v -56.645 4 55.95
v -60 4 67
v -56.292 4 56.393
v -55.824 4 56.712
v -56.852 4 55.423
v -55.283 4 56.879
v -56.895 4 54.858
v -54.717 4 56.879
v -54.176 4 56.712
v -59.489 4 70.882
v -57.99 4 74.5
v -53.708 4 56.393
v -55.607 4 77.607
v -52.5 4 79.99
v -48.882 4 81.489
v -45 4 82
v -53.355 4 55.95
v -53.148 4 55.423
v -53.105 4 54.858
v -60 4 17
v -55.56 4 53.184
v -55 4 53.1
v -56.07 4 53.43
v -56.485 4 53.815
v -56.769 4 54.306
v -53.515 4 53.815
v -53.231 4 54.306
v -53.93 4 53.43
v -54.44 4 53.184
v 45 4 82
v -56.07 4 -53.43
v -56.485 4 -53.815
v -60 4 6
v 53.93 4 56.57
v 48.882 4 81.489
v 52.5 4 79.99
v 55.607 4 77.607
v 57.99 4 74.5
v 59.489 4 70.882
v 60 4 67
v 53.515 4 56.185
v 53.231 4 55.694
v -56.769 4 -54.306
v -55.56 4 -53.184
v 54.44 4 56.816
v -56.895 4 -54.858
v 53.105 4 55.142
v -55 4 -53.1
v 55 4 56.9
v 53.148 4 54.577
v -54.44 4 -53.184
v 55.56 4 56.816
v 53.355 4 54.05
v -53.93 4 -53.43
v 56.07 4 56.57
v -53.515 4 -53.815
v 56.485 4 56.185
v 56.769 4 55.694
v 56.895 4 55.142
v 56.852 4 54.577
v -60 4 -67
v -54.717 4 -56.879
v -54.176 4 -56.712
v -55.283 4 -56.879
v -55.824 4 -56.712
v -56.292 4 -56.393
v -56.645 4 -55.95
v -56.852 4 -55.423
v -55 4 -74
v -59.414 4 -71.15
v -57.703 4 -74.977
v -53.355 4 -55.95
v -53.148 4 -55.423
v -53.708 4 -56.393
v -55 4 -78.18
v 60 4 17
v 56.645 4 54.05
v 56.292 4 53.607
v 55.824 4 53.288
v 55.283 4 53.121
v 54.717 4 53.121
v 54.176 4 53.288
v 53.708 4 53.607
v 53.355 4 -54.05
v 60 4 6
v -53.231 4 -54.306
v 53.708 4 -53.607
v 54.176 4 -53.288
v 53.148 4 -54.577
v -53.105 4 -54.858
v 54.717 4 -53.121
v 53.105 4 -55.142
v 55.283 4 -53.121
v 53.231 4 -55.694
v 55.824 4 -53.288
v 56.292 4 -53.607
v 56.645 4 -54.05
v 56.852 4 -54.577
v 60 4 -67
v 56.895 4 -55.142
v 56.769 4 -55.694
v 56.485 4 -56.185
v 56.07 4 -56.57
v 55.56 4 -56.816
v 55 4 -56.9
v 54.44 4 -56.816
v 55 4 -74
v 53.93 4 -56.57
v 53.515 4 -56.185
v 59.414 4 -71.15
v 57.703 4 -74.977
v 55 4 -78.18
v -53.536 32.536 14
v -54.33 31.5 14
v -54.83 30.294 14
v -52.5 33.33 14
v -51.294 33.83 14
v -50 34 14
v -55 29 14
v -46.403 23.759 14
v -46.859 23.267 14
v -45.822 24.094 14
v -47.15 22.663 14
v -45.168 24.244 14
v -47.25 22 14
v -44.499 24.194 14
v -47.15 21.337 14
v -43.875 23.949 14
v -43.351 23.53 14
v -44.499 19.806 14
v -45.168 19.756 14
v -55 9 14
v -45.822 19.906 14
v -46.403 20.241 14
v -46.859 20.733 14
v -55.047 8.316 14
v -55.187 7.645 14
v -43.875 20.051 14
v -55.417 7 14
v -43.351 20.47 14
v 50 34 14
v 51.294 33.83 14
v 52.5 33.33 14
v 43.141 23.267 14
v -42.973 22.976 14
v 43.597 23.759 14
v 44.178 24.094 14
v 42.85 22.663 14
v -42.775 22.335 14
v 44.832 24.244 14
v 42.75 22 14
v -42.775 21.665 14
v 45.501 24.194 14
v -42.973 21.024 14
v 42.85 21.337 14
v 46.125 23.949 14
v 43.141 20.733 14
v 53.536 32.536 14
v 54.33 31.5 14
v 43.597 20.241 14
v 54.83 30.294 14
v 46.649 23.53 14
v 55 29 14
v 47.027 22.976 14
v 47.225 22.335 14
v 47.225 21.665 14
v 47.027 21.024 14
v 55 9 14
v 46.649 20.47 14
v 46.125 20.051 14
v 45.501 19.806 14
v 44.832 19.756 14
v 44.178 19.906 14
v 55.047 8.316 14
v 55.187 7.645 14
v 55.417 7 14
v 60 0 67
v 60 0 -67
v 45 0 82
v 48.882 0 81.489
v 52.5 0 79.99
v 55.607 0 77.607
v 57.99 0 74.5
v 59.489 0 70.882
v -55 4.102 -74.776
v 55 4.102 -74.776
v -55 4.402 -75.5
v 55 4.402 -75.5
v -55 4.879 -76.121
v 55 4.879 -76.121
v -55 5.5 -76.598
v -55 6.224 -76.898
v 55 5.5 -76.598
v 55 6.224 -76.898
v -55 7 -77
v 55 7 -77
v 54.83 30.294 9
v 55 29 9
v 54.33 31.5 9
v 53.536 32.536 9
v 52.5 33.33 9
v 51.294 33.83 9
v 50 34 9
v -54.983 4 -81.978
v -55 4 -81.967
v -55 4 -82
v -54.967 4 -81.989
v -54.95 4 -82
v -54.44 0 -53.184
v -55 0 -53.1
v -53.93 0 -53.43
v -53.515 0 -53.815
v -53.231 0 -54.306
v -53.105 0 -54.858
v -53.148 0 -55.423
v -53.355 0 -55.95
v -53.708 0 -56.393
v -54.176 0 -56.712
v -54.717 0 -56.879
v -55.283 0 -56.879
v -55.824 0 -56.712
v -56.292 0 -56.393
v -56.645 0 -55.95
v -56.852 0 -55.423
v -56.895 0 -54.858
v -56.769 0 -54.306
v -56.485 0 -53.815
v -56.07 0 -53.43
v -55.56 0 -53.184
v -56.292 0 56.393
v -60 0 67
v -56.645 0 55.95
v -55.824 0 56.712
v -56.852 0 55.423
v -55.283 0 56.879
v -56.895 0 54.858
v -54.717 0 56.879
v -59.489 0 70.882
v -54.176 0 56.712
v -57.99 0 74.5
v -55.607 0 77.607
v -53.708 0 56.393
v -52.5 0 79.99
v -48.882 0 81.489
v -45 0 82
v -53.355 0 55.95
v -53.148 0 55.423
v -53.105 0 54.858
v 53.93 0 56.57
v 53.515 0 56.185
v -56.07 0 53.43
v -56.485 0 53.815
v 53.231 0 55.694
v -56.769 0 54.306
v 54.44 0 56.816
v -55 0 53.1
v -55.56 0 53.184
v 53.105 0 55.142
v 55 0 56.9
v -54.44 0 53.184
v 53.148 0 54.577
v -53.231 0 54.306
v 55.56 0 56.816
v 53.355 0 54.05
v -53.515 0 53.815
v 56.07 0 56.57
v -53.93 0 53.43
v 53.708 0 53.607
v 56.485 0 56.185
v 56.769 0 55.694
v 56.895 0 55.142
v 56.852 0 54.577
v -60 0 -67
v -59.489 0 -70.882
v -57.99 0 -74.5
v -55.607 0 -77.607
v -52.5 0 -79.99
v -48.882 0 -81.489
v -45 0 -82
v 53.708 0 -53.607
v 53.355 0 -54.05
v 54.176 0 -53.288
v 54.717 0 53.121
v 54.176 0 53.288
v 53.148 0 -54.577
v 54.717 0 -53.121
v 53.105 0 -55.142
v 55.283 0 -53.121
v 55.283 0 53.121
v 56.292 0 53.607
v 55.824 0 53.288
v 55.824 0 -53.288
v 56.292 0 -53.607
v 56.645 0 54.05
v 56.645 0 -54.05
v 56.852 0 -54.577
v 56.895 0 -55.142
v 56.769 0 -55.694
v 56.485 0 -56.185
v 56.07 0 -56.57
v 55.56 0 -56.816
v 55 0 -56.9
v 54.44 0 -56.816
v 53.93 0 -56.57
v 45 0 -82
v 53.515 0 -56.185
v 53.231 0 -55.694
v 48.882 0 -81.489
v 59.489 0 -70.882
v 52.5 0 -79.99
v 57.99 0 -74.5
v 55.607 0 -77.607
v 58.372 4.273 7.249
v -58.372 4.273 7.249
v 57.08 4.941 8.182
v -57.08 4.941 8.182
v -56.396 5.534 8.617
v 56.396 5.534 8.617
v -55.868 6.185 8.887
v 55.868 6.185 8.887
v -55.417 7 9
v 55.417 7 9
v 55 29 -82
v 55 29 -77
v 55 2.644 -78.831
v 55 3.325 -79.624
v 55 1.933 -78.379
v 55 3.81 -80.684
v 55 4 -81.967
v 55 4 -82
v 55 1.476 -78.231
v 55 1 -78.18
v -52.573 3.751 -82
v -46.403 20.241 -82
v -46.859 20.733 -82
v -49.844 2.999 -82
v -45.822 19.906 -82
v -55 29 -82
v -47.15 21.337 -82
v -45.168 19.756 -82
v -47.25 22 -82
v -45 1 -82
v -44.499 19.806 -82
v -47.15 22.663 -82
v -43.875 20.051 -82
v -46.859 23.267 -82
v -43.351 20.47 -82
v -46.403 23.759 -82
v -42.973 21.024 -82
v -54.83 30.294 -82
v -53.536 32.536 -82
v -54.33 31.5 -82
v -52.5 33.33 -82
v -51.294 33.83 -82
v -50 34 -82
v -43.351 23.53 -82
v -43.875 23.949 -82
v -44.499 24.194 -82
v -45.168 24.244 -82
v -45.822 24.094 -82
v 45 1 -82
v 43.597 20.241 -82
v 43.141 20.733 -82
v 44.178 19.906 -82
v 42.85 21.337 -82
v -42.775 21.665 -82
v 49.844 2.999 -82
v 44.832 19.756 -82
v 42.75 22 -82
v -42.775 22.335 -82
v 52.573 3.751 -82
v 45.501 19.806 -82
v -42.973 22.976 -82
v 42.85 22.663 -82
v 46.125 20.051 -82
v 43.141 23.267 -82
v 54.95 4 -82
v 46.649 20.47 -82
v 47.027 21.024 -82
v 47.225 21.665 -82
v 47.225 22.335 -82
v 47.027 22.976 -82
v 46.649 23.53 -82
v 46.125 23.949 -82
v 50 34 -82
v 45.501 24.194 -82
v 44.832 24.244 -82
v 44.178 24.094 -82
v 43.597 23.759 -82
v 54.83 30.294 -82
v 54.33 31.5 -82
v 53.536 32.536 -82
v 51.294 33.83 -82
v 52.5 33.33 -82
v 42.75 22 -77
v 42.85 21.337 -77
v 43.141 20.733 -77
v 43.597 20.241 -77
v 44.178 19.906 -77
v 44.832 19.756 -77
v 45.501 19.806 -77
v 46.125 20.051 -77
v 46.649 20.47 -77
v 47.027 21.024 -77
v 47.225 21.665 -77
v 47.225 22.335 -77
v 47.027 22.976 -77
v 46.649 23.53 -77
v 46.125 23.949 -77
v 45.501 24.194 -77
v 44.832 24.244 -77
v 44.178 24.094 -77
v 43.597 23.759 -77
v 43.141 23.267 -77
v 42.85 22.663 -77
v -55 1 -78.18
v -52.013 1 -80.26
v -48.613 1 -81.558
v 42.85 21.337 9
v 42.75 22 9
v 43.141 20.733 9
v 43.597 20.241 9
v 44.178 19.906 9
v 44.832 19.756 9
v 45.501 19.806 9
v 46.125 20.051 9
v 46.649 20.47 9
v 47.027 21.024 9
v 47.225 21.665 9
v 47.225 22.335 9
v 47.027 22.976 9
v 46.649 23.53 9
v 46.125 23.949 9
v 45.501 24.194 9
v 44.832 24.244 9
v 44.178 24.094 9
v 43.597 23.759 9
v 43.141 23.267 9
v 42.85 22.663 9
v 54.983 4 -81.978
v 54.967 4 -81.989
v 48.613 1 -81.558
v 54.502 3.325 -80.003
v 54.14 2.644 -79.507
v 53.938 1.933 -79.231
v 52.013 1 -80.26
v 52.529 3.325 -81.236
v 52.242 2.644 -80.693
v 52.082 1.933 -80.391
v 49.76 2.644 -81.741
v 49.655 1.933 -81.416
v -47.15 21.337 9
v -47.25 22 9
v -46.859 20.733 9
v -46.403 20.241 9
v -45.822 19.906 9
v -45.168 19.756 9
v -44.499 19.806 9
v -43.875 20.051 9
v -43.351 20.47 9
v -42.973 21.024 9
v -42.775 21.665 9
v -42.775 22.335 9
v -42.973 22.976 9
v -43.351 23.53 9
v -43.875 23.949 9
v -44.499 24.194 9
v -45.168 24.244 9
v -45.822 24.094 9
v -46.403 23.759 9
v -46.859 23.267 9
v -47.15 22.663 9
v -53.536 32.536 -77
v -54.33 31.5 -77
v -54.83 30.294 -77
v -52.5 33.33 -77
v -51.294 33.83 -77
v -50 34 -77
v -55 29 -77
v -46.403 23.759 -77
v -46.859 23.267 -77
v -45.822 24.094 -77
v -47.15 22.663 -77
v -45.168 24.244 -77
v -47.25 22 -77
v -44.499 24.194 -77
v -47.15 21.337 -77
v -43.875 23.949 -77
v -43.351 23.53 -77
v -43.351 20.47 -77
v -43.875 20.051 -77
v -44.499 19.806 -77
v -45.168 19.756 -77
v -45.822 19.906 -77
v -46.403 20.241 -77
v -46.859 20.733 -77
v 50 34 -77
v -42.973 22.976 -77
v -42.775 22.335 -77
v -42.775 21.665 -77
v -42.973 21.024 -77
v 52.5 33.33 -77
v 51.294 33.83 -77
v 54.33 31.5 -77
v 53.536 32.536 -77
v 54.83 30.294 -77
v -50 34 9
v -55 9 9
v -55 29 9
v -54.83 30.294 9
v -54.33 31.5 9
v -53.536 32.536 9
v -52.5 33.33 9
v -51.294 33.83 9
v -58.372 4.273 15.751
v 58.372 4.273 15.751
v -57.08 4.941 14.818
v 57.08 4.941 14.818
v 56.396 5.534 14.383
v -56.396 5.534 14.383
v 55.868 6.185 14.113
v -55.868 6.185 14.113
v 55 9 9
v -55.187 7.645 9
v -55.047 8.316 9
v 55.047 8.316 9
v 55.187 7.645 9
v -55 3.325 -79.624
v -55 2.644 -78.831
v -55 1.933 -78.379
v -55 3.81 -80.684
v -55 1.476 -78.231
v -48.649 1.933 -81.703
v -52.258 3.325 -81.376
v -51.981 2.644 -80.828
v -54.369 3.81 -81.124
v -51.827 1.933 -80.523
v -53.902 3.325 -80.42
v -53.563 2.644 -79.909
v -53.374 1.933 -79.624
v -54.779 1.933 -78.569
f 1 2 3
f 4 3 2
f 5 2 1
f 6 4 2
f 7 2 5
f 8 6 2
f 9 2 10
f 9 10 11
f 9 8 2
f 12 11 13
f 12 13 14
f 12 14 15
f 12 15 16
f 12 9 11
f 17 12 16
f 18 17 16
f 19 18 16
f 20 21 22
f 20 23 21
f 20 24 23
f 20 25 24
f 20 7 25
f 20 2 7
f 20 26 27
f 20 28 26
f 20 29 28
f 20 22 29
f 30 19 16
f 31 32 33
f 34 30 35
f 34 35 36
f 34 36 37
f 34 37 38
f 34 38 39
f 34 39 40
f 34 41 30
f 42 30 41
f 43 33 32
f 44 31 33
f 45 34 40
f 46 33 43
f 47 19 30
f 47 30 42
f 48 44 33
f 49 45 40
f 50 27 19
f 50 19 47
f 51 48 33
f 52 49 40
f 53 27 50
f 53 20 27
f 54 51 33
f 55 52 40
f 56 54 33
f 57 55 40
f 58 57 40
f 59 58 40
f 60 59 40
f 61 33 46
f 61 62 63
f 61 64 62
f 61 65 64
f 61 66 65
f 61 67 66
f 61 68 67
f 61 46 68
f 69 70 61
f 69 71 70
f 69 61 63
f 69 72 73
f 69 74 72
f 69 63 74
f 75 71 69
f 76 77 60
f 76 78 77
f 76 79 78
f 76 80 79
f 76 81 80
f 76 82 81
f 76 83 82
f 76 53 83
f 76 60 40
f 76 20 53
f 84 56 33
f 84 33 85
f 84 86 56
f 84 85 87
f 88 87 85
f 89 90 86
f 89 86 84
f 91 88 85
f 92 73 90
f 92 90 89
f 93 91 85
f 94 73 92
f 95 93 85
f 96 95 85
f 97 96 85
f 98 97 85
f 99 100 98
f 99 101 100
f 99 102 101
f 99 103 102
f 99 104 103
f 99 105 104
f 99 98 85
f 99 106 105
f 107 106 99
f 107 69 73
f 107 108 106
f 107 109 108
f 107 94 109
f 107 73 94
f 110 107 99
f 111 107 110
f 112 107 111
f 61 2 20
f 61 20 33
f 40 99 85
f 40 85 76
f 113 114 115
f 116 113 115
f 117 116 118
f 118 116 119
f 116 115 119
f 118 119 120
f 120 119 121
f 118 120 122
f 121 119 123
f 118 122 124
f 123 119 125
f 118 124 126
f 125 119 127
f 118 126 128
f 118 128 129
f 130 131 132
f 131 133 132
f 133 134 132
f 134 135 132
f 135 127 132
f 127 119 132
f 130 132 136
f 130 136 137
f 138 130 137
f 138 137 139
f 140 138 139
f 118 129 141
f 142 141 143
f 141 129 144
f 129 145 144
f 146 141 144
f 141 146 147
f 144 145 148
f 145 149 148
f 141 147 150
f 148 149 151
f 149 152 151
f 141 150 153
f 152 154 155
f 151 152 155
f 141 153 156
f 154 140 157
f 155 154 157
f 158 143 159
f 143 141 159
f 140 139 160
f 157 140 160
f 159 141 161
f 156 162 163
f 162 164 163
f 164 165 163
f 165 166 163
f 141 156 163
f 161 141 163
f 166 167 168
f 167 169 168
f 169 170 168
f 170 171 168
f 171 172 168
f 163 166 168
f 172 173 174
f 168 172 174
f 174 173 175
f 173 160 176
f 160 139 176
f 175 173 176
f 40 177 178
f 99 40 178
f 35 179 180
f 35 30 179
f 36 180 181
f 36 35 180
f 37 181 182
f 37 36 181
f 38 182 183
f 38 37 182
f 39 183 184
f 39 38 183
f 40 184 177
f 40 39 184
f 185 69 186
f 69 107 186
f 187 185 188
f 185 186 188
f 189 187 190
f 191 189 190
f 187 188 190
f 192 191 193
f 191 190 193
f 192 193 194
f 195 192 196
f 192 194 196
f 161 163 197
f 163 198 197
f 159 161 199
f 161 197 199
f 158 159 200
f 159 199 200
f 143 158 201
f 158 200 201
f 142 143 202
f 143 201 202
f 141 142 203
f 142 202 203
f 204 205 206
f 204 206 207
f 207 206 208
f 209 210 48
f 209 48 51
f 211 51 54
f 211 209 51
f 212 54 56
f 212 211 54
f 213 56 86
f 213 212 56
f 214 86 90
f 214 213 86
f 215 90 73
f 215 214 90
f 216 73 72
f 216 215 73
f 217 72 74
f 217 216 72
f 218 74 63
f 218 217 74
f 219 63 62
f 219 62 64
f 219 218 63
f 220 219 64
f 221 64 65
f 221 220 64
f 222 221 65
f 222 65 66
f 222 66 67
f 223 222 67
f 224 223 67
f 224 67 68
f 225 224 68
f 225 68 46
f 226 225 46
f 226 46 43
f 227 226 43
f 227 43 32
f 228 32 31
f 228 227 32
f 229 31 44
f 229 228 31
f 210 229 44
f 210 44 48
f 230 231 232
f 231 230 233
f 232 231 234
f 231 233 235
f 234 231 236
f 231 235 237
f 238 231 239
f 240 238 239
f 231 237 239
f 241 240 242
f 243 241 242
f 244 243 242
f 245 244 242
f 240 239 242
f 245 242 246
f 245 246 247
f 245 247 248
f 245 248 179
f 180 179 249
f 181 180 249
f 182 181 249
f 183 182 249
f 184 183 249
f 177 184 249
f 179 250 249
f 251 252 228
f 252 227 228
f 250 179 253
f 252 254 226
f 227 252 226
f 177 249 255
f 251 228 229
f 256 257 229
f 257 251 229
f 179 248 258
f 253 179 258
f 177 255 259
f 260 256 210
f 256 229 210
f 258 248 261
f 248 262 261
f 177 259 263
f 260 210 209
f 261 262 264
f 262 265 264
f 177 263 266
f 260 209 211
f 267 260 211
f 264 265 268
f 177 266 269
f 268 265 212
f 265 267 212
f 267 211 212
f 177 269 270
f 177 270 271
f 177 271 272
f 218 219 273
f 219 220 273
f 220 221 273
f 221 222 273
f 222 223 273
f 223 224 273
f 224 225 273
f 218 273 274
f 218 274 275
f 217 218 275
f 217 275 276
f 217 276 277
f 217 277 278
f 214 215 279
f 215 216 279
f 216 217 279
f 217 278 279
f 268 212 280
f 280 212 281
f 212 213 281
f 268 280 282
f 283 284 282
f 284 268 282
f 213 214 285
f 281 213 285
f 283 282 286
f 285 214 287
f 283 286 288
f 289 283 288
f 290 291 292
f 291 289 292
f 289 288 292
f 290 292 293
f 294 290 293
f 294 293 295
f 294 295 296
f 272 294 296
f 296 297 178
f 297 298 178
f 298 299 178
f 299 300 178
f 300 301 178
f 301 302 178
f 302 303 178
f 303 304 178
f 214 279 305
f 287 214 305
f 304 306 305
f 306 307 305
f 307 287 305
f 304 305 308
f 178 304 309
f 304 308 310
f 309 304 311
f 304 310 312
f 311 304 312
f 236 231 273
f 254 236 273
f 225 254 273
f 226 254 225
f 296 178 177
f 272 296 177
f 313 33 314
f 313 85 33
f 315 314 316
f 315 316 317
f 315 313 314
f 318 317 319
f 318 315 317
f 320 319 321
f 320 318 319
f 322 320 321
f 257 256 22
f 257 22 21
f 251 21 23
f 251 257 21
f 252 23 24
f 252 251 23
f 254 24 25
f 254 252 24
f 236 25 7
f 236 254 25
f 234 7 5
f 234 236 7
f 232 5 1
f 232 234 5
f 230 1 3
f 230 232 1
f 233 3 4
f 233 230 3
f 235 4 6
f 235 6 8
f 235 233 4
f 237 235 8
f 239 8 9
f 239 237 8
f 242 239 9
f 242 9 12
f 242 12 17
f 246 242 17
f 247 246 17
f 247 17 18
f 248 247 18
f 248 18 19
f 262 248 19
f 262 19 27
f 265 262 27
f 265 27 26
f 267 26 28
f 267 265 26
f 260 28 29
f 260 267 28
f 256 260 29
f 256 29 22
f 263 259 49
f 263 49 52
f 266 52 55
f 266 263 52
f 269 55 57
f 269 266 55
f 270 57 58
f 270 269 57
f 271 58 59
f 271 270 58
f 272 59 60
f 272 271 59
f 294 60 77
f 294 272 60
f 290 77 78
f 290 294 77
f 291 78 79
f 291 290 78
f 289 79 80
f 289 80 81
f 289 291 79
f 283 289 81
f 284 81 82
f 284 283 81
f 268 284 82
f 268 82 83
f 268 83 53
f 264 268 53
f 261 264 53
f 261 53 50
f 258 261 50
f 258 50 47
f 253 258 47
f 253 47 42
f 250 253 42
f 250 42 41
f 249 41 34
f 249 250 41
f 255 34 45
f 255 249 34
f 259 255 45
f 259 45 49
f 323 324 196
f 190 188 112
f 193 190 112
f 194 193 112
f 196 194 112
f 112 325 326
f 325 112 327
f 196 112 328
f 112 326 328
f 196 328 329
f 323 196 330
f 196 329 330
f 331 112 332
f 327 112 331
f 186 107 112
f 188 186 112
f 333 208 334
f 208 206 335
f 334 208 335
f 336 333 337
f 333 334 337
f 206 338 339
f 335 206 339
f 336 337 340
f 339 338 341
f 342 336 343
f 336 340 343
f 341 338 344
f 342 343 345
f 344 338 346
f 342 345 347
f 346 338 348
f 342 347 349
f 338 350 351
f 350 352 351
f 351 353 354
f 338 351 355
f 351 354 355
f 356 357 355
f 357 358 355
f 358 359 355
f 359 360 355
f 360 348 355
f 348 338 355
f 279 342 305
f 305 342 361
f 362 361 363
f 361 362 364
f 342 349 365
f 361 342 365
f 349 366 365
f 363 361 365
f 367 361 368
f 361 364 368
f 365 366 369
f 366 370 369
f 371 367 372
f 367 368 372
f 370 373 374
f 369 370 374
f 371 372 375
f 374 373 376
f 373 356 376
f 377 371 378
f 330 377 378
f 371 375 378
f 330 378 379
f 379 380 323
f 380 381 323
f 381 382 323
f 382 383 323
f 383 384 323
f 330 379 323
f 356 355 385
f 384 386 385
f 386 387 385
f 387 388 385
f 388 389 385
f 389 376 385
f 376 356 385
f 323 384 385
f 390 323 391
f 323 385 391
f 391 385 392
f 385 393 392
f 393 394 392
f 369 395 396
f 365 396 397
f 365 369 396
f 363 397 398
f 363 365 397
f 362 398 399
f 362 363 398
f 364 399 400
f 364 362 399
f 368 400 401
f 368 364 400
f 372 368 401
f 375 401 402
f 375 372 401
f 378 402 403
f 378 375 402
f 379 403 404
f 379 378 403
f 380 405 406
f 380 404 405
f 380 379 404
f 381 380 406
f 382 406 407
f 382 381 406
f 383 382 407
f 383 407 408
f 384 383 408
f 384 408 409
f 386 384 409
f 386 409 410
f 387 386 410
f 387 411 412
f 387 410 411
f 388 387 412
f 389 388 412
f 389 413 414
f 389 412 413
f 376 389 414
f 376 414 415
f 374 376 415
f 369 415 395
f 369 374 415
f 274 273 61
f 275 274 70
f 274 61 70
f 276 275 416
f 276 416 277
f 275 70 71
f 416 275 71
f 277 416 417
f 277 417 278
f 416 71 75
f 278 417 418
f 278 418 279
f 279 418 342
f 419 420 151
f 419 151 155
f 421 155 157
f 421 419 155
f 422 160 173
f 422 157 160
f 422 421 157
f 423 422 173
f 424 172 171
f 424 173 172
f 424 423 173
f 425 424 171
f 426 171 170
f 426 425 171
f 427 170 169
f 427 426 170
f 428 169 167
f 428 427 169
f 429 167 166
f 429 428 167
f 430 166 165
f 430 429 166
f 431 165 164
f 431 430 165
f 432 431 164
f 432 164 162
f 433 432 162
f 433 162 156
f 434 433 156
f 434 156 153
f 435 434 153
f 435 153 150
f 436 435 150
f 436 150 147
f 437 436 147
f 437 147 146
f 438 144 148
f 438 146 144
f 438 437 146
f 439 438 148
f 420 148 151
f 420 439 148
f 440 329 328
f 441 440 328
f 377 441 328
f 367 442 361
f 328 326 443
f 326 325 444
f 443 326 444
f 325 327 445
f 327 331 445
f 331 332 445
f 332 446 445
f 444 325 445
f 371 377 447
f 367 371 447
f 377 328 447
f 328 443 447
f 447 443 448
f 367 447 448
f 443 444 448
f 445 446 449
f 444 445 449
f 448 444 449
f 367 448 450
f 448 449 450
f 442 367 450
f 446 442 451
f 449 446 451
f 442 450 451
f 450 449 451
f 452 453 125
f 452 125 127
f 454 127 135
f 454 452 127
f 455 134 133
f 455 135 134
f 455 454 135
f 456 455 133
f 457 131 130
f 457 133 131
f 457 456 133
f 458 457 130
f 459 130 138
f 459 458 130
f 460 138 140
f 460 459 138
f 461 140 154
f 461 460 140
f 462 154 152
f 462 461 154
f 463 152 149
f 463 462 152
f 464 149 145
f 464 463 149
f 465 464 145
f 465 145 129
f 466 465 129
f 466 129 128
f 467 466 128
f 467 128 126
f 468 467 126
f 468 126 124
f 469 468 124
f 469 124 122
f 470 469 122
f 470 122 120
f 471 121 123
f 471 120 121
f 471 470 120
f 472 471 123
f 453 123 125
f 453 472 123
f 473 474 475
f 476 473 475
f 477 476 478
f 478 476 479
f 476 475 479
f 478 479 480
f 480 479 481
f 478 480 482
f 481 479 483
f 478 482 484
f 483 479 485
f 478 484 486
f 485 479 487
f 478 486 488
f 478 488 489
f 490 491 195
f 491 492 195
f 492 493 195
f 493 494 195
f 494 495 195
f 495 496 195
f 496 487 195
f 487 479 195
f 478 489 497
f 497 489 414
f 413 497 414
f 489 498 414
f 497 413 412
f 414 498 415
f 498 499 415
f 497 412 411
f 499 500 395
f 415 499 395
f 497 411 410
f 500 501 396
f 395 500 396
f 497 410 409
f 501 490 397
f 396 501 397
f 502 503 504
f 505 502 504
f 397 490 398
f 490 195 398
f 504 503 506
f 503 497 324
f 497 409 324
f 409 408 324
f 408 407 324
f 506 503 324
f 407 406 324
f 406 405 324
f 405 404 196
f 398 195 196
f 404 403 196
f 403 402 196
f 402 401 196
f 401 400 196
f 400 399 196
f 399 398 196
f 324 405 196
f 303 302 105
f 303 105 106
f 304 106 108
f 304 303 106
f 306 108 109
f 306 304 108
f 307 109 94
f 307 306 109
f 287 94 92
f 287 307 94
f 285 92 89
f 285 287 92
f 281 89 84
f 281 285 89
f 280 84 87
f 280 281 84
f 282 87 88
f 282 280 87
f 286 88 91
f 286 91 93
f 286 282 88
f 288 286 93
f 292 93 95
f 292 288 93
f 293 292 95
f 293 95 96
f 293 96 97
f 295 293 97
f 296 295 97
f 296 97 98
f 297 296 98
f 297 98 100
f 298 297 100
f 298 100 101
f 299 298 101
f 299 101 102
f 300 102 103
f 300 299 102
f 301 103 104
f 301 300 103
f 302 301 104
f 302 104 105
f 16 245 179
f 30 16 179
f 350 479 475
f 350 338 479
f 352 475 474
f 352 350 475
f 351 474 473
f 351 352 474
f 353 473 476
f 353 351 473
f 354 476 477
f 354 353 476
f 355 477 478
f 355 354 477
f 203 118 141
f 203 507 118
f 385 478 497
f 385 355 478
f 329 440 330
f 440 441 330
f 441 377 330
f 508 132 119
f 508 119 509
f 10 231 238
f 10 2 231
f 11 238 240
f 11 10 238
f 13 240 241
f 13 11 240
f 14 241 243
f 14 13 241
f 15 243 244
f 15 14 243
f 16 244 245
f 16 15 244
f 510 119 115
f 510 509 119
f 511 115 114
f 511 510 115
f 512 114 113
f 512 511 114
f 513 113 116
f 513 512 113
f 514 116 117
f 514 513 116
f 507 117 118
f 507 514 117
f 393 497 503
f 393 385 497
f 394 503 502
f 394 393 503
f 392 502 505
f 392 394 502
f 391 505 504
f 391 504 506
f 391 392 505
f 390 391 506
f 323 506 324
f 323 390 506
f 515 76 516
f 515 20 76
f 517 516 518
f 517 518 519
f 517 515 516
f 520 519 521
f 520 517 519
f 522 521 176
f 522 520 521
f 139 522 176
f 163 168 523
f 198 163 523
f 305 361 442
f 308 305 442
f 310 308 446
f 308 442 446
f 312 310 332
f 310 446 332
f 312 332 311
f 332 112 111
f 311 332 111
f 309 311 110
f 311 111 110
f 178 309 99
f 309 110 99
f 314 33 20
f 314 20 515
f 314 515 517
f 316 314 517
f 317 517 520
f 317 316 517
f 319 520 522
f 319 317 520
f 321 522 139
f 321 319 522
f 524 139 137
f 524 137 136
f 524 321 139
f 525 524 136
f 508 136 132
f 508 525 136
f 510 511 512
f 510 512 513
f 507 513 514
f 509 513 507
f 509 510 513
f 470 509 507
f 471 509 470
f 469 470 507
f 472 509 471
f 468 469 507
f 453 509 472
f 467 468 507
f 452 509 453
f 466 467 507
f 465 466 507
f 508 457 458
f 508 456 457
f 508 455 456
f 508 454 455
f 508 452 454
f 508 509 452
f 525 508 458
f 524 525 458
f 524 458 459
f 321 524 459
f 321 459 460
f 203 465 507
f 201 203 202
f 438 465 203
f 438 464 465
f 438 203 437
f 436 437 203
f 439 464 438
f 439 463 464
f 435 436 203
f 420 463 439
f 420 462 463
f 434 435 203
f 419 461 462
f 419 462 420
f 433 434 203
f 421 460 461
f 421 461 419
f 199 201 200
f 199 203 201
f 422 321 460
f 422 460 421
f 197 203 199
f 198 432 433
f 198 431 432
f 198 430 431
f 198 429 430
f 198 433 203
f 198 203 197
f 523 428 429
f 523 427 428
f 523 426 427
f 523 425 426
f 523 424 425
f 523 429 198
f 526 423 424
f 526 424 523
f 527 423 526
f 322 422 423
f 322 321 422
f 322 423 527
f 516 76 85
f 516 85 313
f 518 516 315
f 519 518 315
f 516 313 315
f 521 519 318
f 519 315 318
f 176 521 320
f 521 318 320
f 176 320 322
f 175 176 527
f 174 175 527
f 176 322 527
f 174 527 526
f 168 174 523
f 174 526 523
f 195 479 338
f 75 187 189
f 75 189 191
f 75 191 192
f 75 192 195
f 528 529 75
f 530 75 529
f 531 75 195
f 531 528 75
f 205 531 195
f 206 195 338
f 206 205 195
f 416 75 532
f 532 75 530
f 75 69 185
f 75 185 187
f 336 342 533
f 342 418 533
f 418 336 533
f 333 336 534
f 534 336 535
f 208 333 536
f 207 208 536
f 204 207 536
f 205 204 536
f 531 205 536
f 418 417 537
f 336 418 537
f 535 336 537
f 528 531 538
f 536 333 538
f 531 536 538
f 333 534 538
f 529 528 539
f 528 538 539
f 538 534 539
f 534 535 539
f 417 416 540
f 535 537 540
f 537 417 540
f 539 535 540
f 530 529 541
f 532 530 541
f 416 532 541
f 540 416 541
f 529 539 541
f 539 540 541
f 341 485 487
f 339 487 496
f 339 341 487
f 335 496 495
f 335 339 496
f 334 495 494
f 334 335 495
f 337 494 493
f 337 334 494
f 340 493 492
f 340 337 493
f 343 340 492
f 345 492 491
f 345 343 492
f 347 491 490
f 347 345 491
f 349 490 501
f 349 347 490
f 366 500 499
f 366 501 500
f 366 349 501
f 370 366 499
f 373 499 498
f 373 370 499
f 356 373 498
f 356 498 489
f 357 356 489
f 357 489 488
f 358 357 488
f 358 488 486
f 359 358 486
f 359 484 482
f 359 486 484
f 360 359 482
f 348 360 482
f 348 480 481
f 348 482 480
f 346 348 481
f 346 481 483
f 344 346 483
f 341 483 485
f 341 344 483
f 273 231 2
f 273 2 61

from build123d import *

# Parameters (mm, degrees)
SKETCH_1_W          = 120
SKETCH_1_H          = 164
SKETCH_1_R          = 1.9
EXTRUDE_1_DEPTH     = 4
FILLET_1_R          = 15
SKETCH_2_W          = 110
SKETCH_2_H          = 5
EXTRUDE_2_DEPTH     = 30
CUT_EXTRUDE_1_REACH = 179.91
SKETCH_3_R          = 2.25
FILLET_2_R          = 5
FILLET_3_R          = 3
FILLET_4_R          = 3


# Some blends are built 0.0001 mm under size
with BuildPart() as part:
    # Эскиз1 → Бобышка-Вытянуть1 (new body)
    with BuildSketch(Plane(origin=(0, 0, 0), x_dir=(1, 0, 0), z_dir=(0, 1, 0))):
        Rectangle(SKETCH_1_W, SKETCH_1_H)
        with Locations(Location((-55, 55, 0), (0, 0, 270))):
            Circle(SKETCH_1_R, mode=Mode.SUBTRACT)
        with Locations(Location((55, 55, 0), (0, 0, 90))):
            Circle(SKETCH_1_R, mode=Mode.SUBTRACT)
        with Locations(Location((55, -55, 0), (0, 0, 270))):
            Circle(SKETCH_1_R, mode=Mode.SUBTRACT)
        with Locations(Location((-55, -55, 0), (0, 0, 90))):
            Circle(SKETCH_1_R, mode=Mode.SUBTRACT)
    extrude(amount=EXTRUDE_1_DEPTH)

    # Скругление1
    fillet_1_edges = [part.edges().sort_by_distance(p)[0] for p in [
        (60, 2, 82),
        (-60, 2, 82),
        (-60, 2, -82),
        (60, 2, -82),
    ]]
    fillet(fillet_1_edges, radius=FILLET_1_R)

    # Эскиз2 → Бобышка-Вытянуть2 (add)
    with BuildSketch(Plane(origin=(0, 4, 0), x_dir=(1, 0, 0), z_dir=(0, 1, 0))):
        with Locations((0, 79.5)):
            Rectangle(SKETCH_2_W, SKETCH_2_H)
        with Locations((0, -11.5)):
            Rectangle(SKETCH_2_W, SKETCH_2_H)
    extrude(amount=EXTRUDE_2_DEPTH)

    # Вырез-Вытянуть1: up to this face of the body (flat: up to its plane)
    cut_extrude_1_end = Plane(part.part.faces().sort_by_distance((0, 19, 14))[0])
    # Эскиз3 → Вырез-Вытянуть1 (cut, up to the picked face)
    with BuildSketch(Plane.XY.offset(-82), mode=Mode.PRIVATE) as cut_extrude_1_sk1:
        with Locations(Location((-45, 22, 0), (0, 0, 180))):
            Circle(SKETCH_3_R)
    cut_extrude_1_tool1 = split(extrude(cut_extrude_1_sk1.sketch, amount=CUT_EXTRUDE_1_REACH, mode=Mode.PRIVATE), bisect_by=cut_extrude_1_end, keep=Keep.BOTH, mode=Mode.PRIVATE)
    # Эскиз3 → Вырез-Вытянуть1 (cut, up to the picked face)
    with BuildSketch(Plane.XY.offset(-82), mode=Mode.PRIVATE) as cut_extrude_1_sk2:
        with Locations(Location((45, 22, 0), (0, 0, 180))):
            Circle(SKETCH_3_R)
    cut_extrude_1_tool2 = split(extrude(cut_extrude_1_sk2.sketch, amount=CUT_EXTRUDE_1_REACH, mode=Mode.PRIVATE), bisect_by=cut_extrude_1_end, keep=Keep.BOTH, mode=Mode.PRIVATE)
    add(cut_extrude_1_tool1.solids().sort_by(Axis((-45, 22, -82), (0, 0, 1)))[0], mode=Mode.SUBTRACT)
    add(cut_extrude_1_tool2.solids().sort_by(Axis((45, 22, -82), (0, 0, 1)))[0], mode=Mode.SUBTRACT)

    # Скругление2
    fillet_2_edges = [part.edges().sort_by_distance(p)[0] for p in [
        (55, 34, -79.5),
        (-55, 34, -79.5),
        (-55, 4, 11.5),
        (55, 4, 11.5),
        (-55, 34, 11.5),
        (55, 34, 11.5),
    ]]
    fillet(fillet_2_edges, radius=FILLET_2_R - 0.0001)  # a hair under: the kernel refuses the full size

    # Скругление3
    fillet_3_edges = [part.edges().sort_by_distance(p)[0] for p in [
        (0, 4, -77),
        (0, 4, 14),
        (0, 4, 9),
    ]]
    fillet(fillet_3_edges, radius=FILLET_3_R)

    # Скругление4
    # the kernel refuses this fillet: 3 mm, written as the material it adds along each edge
    with BuildSketch(Plane(origin=(-45, 4, -67), x_dir=(0.7513290268597076, 0, -0.659927794079053), z_dir=(0.659927794079053, 0, 0.7513290268597076))) as fillet_4_piece_1_section:
        with BuildLine():
            CenterArc((15 + FILLET_4_R, -FILLET_4_R), FILLET_4_R, 90, 90)
            Line((15, -FILLET_4_R), (15, 0))
            Line((15, 0), (15 + FILLET_4_R, 0))
        make_face()
    fillet_4_piece_1 = revolve(axis=Axis((-45, 4, -67), (0, 1, 0)), revolution_arc=119.166321534, mode=Mode.PRIVATE)
    fillet_4_piece_1 = split(fillet_4_piece_1, bisect_by=Plane(origin=(-45, 4, -82), z_dir=(0, 0, 1)), keep=Keep.TOP, mode=Mode.PRIVATE)
    fillet_4_piece_1 = split(fillet_4_piece_1, bisect_by=Plane(origin=(-55, 4, -67), z_dir=(1, 0, 0)), keep=Keep.TOP, mode=Mode.PRIVATE)
    add(fillet_4_piece_1)
    with BuildSketch(Plane(origin=(45, 4, -67), x_dir=(0.9424122347792039, 0, -0.33445355393307824), z_dir=(0.33445355393307824, 0, 0.9424122347792039))) as fillet_4_piece_2_section:
        with BuildLine():
            CenterArc((15 + FILLET_4_R, -FILLET_4_R), FILLET_4_R, 90, 90)
            Line((15, -FILLET_4_R), (15, 0))
            Line((15, 0), (15 + FILLET_4_R, 0))
        make_face()
    fillet_4_piece_2 = revolve(axis=Axis((45, 4, -67), (0, 1, 0)), revolution_arc=119.166321534, mode=Mode.PRIVATE)
    fillet_4_piece_2 = split(fillet_4_piece_2, bisect_by=Plane(origin=(45, 4, -82), z_dir=(0, 0, 1)), keep=Keep.TOP, mode=Mode.PRIVATE)
    fillet_4_piece_2 = split(fillet_4_piece_2, bisect_by=Plane(origin=(55, 4, -67), z_dir=(-1, 0, 0)), keep=Keep.TOP, mode=Mode.PRIVATE)
    add(fillet_4_piece_2)


solid = part.part
